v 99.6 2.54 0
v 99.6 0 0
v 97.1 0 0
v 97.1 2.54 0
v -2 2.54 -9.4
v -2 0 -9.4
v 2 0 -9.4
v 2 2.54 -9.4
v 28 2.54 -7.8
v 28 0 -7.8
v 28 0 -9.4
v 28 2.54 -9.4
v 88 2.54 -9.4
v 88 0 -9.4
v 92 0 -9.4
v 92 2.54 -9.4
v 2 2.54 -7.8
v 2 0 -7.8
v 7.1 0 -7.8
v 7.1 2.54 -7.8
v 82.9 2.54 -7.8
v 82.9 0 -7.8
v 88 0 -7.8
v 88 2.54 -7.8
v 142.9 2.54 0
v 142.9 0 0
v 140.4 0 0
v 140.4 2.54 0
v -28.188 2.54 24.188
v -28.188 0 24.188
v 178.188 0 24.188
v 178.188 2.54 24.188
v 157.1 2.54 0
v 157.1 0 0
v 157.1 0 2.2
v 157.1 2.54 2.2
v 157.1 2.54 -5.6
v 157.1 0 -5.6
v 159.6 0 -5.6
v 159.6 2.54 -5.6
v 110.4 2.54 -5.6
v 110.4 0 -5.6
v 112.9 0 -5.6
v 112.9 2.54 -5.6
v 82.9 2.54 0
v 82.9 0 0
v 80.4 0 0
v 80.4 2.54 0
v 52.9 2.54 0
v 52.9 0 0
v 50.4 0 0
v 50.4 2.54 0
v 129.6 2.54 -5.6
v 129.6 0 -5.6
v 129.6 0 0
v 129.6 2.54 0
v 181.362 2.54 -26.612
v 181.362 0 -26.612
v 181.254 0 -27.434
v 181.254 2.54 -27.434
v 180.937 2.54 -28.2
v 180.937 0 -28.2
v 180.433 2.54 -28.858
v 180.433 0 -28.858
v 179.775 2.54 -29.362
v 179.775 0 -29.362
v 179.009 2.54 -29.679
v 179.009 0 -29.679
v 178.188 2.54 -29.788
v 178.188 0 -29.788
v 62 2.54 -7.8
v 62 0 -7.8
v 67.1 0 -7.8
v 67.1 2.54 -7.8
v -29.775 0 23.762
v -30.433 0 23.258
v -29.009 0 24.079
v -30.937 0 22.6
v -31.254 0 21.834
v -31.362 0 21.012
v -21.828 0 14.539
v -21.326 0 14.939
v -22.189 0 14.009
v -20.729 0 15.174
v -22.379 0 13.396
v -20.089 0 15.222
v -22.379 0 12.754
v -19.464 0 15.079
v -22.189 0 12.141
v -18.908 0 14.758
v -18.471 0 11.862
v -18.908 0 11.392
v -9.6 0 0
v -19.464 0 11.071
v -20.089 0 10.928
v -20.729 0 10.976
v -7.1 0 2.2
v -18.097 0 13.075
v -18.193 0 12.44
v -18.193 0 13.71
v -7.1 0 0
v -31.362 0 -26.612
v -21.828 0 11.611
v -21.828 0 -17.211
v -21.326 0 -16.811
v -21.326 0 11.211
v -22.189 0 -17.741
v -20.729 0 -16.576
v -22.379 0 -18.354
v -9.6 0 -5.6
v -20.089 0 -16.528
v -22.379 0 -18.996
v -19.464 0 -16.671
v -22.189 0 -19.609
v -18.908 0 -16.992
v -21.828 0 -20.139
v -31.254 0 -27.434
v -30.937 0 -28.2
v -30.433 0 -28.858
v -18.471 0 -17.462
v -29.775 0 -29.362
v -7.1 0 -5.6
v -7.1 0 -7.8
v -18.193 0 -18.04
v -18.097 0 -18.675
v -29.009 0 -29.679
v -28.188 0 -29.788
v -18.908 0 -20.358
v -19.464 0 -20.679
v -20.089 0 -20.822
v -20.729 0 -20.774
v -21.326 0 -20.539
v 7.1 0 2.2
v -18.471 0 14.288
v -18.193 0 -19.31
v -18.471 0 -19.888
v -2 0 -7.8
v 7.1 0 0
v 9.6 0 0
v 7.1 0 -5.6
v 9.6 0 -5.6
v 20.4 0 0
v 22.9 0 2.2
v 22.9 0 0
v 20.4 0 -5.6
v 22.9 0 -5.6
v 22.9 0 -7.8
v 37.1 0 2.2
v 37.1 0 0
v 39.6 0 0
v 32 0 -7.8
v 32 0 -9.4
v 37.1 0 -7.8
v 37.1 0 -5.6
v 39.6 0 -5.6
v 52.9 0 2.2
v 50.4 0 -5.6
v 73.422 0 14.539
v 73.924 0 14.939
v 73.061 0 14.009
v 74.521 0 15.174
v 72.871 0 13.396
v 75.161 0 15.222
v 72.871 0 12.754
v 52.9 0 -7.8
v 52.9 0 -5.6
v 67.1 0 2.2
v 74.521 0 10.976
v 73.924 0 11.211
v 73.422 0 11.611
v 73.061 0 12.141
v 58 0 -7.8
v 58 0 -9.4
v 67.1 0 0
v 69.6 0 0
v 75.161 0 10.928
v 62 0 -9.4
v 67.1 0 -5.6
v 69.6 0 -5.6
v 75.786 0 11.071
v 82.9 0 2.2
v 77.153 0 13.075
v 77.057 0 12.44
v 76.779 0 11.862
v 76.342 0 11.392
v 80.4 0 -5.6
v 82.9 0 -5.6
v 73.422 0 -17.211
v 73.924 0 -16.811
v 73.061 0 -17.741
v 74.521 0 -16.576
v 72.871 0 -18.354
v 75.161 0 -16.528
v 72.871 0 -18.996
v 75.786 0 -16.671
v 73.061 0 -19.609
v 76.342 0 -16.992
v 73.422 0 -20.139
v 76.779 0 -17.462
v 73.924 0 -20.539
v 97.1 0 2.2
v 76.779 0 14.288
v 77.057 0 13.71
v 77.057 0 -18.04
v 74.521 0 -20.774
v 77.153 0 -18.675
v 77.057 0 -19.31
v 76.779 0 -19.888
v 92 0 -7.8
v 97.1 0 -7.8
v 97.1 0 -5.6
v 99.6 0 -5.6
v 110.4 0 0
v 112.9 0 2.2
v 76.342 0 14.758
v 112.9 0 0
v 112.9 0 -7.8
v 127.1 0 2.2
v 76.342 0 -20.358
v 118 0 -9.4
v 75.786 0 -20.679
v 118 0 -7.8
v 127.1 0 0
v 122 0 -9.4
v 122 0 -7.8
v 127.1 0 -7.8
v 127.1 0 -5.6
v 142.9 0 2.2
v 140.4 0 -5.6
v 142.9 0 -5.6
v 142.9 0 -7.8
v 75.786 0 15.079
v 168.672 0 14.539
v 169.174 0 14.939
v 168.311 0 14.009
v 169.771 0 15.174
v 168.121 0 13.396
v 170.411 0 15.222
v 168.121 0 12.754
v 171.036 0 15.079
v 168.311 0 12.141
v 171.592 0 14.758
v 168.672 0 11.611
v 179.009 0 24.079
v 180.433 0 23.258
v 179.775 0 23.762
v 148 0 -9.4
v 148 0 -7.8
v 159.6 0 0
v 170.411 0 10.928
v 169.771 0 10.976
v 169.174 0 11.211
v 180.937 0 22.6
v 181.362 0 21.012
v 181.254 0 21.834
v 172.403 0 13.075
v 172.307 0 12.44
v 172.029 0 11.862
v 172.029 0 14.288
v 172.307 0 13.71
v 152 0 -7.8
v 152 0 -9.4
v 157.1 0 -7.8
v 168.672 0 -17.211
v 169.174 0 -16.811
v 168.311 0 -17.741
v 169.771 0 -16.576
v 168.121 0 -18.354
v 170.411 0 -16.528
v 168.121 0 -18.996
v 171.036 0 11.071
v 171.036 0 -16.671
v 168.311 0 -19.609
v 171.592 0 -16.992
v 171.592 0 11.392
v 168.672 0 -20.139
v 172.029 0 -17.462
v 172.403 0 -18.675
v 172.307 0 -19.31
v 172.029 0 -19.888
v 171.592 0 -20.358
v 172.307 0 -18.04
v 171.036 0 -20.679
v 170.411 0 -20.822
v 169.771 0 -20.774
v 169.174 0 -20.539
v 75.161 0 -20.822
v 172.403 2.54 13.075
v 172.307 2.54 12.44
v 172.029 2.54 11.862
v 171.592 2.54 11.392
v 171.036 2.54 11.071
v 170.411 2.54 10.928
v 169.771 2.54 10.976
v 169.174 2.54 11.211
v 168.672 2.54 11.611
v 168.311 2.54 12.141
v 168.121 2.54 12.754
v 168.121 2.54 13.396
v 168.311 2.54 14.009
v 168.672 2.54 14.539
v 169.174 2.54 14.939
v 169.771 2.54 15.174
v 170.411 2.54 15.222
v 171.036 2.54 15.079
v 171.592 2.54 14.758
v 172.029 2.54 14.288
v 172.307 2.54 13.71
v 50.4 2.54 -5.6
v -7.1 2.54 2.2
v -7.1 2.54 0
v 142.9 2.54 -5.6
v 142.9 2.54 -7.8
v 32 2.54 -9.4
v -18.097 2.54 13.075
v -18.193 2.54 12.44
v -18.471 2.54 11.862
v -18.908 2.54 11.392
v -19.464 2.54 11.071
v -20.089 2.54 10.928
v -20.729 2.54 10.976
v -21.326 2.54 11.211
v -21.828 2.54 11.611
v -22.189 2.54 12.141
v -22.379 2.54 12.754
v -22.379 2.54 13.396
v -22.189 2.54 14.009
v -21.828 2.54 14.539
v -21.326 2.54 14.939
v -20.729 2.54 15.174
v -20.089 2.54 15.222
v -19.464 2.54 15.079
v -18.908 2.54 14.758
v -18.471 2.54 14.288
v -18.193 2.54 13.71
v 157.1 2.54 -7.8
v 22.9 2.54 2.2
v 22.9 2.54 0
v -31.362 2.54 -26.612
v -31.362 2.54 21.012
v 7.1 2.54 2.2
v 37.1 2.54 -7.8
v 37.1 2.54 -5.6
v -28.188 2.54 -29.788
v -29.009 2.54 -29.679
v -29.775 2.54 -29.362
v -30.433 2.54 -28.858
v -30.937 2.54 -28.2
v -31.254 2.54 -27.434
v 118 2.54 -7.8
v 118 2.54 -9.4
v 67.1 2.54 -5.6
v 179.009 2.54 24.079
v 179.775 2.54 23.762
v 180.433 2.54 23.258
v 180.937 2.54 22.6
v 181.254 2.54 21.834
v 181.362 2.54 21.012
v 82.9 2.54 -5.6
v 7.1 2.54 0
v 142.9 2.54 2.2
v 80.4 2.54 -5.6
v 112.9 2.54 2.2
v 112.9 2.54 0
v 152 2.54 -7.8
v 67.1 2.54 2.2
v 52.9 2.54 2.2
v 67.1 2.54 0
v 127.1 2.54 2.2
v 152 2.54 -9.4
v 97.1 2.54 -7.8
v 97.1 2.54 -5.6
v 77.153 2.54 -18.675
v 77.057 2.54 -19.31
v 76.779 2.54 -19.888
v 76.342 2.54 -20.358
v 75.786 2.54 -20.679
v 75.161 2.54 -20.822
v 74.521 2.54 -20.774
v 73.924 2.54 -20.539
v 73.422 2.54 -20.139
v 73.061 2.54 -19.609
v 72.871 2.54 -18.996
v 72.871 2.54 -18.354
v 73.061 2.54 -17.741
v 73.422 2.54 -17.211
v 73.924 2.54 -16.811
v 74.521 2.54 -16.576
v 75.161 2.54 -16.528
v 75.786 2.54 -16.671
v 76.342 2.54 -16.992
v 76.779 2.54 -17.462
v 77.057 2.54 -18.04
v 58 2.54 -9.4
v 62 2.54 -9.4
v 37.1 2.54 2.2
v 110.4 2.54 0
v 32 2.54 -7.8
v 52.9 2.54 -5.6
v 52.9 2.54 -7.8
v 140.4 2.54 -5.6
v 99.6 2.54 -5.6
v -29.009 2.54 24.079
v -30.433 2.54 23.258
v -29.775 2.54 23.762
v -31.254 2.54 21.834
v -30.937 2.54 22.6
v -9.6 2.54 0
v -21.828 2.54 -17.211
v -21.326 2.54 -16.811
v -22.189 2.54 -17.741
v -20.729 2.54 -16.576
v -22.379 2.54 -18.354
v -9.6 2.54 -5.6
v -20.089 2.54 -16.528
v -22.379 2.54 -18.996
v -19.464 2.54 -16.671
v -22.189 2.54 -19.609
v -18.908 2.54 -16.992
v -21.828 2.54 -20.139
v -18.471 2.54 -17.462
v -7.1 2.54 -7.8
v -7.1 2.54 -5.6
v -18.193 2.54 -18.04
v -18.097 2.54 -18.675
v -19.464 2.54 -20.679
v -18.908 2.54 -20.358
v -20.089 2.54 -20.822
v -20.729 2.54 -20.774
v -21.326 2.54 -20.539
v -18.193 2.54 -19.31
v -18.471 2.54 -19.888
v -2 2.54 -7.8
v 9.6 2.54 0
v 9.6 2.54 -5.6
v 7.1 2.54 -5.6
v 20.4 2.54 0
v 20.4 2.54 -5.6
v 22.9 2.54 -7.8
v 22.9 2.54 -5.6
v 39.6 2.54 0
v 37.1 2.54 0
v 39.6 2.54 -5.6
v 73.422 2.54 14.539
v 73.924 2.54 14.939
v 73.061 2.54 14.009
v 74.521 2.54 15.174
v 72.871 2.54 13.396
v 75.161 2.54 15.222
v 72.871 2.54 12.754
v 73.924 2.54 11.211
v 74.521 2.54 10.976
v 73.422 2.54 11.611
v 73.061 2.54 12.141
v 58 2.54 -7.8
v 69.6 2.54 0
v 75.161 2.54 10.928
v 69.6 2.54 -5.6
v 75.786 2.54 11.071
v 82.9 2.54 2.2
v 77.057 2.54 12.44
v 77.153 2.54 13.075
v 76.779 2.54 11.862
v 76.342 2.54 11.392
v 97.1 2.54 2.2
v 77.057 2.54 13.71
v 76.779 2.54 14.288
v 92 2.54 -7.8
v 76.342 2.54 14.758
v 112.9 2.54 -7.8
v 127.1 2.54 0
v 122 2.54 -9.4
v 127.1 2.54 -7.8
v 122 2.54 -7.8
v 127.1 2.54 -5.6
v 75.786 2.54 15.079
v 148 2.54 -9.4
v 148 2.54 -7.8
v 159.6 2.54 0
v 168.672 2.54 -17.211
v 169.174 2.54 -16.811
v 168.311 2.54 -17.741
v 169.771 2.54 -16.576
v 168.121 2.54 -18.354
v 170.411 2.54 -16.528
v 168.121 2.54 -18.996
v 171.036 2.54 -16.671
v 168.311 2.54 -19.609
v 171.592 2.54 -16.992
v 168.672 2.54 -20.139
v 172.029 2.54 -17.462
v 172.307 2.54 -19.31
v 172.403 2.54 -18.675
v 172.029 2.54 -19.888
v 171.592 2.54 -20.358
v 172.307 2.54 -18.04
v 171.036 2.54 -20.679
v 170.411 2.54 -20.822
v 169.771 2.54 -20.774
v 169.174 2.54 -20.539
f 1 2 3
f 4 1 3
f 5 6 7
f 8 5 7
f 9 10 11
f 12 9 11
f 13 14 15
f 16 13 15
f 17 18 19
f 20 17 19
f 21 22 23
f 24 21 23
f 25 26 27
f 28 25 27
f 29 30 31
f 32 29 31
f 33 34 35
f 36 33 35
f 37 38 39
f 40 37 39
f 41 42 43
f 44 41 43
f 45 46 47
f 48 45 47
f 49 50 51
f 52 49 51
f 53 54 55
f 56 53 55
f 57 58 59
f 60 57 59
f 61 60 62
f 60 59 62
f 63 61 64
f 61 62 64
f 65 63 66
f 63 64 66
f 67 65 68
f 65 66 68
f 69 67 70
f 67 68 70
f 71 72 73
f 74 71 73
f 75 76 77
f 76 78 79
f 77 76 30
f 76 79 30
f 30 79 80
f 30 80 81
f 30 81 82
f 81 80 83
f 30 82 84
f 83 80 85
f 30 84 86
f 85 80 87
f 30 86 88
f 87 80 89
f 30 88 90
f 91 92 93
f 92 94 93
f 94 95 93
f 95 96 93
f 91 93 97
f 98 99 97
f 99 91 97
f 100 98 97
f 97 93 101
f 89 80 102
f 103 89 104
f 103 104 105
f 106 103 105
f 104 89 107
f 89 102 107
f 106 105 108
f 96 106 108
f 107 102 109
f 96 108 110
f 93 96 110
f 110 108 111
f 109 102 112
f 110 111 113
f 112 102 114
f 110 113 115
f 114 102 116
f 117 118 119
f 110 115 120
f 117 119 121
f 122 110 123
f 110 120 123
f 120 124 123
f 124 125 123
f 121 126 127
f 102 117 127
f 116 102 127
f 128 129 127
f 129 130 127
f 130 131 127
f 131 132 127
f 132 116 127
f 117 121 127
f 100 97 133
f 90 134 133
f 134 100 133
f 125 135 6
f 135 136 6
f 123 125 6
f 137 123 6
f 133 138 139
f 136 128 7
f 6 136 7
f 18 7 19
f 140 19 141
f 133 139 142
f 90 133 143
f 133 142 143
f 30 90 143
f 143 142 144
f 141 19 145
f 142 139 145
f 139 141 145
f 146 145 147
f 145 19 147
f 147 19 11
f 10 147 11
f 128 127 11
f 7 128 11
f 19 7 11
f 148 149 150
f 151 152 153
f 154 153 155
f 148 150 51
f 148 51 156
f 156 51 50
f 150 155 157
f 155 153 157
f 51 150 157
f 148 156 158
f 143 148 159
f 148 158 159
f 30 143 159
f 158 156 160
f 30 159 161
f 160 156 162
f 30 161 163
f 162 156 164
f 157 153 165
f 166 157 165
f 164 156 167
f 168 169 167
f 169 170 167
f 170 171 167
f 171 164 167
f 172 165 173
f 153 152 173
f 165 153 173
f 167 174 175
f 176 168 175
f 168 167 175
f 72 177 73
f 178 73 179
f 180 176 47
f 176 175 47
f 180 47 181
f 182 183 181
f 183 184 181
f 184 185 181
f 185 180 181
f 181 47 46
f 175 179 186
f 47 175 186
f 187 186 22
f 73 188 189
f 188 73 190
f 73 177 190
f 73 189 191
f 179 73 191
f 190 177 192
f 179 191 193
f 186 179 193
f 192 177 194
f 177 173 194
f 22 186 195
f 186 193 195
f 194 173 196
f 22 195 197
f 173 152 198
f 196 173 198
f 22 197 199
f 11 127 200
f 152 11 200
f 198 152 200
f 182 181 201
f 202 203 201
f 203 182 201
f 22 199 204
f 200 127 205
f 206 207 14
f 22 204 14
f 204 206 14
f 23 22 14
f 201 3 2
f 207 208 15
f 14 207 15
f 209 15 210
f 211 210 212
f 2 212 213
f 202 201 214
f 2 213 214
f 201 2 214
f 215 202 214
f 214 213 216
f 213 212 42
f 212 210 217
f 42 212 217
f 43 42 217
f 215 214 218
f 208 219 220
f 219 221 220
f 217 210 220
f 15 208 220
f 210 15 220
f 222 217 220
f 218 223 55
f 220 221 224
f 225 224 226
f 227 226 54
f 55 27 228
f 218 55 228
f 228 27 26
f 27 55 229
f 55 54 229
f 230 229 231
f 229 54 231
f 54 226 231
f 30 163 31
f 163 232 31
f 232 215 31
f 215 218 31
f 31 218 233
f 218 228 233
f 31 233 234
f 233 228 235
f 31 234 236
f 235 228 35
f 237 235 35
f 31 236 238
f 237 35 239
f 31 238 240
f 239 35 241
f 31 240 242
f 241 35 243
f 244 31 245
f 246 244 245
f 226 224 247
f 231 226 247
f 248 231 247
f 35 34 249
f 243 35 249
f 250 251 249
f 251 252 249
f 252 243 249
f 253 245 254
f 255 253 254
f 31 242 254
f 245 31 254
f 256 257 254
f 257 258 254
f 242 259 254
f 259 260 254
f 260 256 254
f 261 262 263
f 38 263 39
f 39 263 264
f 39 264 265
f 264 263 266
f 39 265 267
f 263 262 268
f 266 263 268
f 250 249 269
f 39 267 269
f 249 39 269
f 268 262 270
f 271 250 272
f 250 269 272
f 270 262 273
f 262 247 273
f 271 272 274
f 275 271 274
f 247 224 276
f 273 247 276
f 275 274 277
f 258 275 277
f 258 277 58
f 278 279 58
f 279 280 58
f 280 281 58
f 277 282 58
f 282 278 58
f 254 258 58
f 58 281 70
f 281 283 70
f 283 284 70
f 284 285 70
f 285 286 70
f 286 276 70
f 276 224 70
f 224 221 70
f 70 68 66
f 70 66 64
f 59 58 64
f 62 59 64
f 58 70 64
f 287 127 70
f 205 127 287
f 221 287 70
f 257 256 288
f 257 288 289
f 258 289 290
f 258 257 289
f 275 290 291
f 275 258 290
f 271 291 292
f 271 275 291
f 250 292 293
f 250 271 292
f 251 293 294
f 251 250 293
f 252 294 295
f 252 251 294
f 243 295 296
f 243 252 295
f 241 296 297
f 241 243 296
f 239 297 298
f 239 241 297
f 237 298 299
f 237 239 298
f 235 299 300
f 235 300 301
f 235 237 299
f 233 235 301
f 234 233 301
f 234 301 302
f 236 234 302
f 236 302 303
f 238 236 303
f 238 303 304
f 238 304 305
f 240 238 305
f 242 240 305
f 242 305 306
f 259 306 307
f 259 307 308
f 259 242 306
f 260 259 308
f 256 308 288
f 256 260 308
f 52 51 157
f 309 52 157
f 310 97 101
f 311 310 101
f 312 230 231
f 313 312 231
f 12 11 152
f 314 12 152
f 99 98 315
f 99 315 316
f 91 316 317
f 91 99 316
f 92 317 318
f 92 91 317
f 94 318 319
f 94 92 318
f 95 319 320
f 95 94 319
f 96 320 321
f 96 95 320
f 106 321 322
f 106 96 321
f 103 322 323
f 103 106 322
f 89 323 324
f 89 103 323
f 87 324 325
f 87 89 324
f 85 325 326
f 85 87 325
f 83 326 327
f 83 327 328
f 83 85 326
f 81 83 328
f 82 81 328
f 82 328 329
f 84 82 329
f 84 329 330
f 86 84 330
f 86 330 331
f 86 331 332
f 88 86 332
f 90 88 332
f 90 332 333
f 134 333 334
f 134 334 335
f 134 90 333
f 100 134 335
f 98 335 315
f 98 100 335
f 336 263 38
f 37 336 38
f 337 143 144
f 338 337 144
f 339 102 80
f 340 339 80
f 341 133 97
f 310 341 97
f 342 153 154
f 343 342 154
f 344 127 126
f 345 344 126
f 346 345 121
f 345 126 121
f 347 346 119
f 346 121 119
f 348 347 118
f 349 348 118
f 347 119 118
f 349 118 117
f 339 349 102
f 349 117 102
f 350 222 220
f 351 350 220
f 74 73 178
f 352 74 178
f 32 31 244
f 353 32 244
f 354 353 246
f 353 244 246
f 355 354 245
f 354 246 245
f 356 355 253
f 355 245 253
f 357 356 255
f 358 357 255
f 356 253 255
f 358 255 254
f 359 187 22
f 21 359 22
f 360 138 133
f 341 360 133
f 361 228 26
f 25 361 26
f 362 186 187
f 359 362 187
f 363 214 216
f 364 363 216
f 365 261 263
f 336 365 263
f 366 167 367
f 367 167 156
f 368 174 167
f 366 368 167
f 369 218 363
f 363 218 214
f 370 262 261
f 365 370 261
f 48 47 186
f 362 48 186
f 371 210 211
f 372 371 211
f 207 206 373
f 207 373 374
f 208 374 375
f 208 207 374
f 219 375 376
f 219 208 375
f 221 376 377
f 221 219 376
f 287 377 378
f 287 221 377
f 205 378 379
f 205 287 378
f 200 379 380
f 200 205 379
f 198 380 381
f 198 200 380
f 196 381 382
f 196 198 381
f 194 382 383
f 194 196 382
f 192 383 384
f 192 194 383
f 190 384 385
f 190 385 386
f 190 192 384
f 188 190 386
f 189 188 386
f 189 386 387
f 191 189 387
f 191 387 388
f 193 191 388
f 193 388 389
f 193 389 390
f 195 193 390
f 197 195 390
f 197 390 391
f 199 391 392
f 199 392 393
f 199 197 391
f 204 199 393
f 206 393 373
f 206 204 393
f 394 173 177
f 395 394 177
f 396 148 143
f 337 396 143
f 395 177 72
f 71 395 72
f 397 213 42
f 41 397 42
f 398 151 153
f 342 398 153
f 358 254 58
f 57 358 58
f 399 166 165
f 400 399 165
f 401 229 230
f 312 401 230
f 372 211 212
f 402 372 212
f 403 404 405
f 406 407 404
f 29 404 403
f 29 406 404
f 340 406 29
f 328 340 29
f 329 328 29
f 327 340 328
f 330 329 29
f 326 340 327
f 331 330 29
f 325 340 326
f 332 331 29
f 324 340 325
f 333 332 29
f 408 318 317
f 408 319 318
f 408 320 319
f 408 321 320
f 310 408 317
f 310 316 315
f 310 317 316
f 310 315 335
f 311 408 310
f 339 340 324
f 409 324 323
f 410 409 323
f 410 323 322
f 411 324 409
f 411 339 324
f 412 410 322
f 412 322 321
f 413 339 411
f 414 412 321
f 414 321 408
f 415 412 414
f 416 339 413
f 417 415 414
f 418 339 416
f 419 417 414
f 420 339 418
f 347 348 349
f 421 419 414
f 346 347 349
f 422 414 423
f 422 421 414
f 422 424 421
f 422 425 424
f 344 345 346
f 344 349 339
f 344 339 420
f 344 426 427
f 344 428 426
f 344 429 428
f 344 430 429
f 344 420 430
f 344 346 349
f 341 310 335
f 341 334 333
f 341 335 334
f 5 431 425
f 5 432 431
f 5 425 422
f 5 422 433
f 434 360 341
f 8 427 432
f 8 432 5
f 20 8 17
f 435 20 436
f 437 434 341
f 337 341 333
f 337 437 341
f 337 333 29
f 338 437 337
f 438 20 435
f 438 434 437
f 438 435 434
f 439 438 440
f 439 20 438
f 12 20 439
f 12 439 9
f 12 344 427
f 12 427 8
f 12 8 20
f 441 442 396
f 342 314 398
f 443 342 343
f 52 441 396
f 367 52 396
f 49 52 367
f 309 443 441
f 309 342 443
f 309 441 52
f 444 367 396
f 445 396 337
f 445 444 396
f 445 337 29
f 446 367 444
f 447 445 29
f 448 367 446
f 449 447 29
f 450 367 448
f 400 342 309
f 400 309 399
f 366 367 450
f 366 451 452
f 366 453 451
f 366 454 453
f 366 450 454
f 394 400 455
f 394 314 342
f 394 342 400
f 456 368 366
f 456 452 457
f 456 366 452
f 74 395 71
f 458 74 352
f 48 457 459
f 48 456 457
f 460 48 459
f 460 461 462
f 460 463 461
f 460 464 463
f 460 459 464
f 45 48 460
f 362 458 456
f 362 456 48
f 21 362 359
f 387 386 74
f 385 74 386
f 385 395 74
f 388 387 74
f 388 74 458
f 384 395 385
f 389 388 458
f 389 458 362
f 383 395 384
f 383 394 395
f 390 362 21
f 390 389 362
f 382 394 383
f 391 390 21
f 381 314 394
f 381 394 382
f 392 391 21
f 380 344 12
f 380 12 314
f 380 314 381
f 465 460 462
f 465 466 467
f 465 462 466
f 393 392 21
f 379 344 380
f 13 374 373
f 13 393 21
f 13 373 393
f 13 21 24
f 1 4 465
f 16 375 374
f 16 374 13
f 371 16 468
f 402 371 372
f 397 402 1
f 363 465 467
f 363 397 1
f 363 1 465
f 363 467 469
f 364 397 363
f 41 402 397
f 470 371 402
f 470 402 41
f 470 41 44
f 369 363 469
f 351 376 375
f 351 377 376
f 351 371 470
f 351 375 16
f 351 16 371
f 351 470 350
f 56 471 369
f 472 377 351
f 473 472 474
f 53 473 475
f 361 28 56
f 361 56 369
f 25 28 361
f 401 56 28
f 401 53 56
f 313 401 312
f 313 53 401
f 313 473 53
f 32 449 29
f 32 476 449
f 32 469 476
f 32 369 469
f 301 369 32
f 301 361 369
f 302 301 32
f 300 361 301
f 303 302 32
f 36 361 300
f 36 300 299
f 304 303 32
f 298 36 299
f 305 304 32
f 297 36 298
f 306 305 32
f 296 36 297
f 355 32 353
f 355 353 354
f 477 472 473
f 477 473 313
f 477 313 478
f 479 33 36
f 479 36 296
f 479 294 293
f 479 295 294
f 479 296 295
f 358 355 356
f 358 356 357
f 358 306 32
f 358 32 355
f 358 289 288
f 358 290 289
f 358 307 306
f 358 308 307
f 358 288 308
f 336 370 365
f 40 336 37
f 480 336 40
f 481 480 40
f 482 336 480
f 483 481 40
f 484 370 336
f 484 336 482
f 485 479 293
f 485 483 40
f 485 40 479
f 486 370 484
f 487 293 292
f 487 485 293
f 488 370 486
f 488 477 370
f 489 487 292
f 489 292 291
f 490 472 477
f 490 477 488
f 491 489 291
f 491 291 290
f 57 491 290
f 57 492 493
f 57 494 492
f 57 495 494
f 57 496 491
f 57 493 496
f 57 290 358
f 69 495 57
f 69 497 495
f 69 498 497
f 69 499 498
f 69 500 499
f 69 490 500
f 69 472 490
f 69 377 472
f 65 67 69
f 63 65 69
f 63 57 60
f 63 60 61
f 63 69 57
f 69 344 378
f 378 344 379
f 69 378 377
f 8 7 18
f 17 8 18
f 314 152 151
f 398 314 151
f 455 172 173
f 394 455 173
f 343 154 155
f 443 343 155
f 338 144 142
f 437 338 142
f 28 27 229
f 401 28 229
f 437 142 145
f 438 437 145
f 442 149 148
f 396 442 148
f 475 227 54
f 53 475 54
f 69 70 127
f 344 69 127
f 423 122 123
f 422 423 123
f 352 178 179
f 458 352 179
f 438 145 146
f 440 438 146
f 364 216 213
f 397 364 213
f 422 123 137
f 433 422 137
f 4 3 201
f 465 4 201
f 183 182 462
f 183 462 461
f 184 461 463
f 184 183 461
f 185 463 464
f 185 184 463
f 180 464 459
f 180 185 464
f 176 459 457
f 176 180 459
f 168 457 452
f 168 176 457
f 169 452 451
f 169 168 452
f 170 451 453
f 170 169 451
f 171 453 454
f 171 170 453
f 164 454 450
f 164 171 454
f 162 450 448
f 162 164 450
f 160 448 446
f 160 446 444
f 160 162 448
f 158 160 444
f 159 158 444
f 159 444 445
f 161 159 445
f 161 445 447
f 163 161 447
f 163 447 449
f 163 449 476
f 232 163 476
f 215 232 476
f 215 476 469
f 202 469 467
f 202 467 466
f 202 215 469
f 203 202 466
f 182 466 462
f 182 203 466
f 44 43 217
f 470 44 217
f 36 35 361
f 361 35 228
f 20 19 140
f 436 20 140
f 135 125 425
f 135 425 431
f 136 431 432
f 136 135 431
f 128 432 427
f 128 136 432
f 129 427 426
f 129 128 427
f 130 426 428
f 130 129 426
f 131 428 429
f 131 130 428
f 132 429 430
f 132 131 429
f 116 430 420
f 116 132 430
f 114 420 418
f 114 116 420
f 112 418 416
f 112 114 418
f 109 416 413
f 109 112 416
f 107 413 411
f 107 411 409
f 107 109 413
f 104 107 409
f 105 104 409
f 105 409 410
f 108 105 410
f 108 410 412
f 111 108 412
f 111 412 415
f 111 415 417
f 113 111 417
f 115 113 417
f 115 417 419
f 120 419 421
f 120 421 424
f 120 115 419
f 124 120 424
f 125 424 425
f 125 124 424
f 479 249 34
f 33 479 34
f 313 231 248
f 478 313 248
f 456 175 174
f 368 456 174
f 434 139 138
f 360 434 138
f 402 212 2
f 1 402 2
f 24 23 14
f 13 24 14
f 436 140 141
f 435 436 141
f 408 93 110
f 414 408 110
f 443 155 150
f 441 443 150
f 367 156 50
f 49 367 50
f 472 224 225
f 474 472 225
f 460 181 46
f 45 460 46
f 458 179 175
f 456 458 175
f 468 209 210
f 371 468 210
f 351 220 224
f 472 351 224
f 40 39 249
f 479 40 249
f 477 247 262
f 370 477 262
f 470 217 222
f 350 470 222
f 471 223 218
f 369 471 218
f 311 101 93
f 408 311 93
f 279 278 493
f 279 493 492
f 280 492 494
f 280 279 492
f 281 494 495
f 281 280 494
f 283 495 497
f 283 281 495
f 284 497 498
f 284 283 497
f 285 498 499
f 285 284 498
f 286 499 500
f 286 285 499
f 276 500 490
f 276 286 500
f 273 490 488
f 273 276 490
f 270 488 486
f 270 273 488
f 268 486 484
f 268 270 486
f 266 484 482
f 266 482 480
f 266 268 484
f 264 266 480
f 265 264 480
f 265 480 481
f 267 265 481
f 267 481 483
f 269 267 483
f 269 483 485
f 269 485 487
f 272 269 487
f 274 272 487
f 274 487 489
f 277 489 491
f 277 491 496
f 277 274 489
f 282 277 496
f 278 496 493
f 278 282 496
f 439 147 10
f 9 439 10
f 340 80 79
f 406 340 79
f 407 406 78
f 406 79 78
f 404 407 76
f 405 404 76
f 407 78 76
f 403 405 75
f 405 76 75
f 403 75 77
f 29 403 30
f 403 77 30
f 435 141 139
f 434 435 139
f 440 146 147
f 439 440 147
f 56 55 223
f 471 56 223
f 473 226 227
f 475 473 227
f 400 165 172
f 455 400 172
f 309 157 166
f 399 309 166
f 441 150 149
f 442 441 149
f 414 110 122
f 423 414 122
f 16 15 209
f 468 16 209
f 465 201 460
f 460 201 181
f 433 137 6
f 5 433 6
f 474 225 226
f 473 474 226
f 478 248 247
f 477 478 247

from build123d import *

# Parameters (mm, degrees)
SKETCH1_R           = 2.15265
BOSS_EXTRUDE1_DEPTH = 2.54


with BuildPart() as part:
    # Sketch1 → Boss-Extrude1 (new body)
    with BuildSketch(Plane(origin=(0, 0, 0), x_dir=(1, 0, 0), z_dir=(0, 1, 0))):
        with BuildLine():
            Line((178.1875, 29.7875), (-28.1875, 29.7875))
            ThreePointArc((-28.1875, 29.7875), (-30.43256403, 28.85756403), (-31.3625, 26.6125))
            Line((-31.3625, 26.6125), (-31.3625, -21.0125))
            ThreePointArc((-31.3625, -21.0125), (-30.43256403, -23.25756403), (-28.1875, -24.1875))
            Line((-28.1875, -24.1875), (178.1875, -24.1875))
            ThreePointArc((178.1875, -24.1875), (180.43256403, -23.25756403), (181.3625, -21.0125))
            Line((181.3625, -21.0125), (181.3625, 26.6125))
            ThreePointArc((181.3625, 26.6125), (180.43256403, 28.85756403), (178.1875, 29.7875))
        make_face()
        with Locations((-20.25, -13.075)):
            Circle(SKETCH1_R, mode=Mode.SUBTRACT)
        with Locations((75, -13.075)):
            Circle(SKETCH1_R, mode=Mode.SUBTRACT)
        with Locations((170.25, -13.075)):
            Circle(SKETCH1_R, mode=Mode.SUBTRACT)
        Polygon((-1.999996, 7.8), (-1.999996, 9.4), (1.999996, 9.4), (1.999996, 7.8), (7.1, 7.8), (7.1, 5.6), (9.6, 5.6), (9.6, 0), (7.1, 0), (7.1, -2.2), (-7.1, -2.2), (-7.1, 0), (-9.6, 0), (-9.6, 5.6), (-7.1, 5.6), (-7.1, 7.8), align=None, mode=Mode.SUBTRACT)
        Polygon((28.000004, 7.8), (28.000004, 9.4), (31.999996, 9.4), (31.999996, 7.8), (37.1, 7.8), (37.1, 5.6), (39.6, 5.6), (39.6, 0), (37.1, 0), (37.1, -2.2), (22.9, -2.2), (22.9, 0), (20.4, 0), (20.4, 5.6), (22.9, 5.6), (22.9, 7.8), align=None, mode=Mode.SUBTRACT)
        Polygon((58.000004, 7.8), (58.000004, 9.4), (61.999996, 9.4), (61.999996, 7.8), (67.1, 7.8), (67.1, 5.6), (69.6, 5.6), (69.6, 0), (67.1, 0), (67.1, -2.2), (52.9, -2.2), (52.9, 0), (50.4, 0), (50.4, 5.6), (52.9, 5.6), (52.9, 7.8), align=None, mode=Mode.SUBTRACT)
        with Locations((-20.25, 18.675)):
            Circle(SKETCH1_R, mode=Mode.SUBTRACT)
        Polygon((88.000004, 7.8), (88.000004, 9.4), (91.999996, 9.4), (91.999996, 7.8), (97.1, 7.8), (97.1, 5.6), (99.6, 5.6), (99.6, 0), (97.1, 0), (97.1, -2.2), (82.9, -2.2), (82.9, 0), (80.4, 0), (80.4, 5.6), (82.9, 5.6), (82.9, 7.8), align=None, mode=Mode.SUBTRACT)
        Polygon((118.000004, 7.8), (118.000004, 9.4), (121.999996, 9.4), (121.999996, 7.8), (127.1, 7.8), (127.1, 5.6), (129.6, 5.6), (129.6, 0), (127.1, 0), (127.1, -2.2), (112.9, -2.2), (112.9, 0), (110.4, 0), (110.4, 5.6), (112.9, 5.6), (112.9, 7.8), align=None, mode=Mode.SUBTRACT)
        Polygon((148.000004, 7.8), (148.000004, 9.4), (151.999996, 9.4), (151.999996, 7.8), (157.1, 7.8), (157.1, 5.6), (159.6, 5.6), (159.6, 0), (157.1, 0), (157.1, -2.2), (142.9, -2.2), (142.9, 0), (140.4, 0), (140.4, 5.6), (142.9, 5.6), (142.9, 7.8), align=None, mode=Mode.SUBTRACT)
        with Locations((75, 18.675)):
            Circle(SKETCH1_R, mode=Mode.SUBTRACT)
        with Locations((170.25, 18.675)):
            Circle(SKETCH1_R, mode=Mode.SUBTRACT)
    extrude(amount=BOSS_EXTRUDE1_DEPTH)


solid = part.part
